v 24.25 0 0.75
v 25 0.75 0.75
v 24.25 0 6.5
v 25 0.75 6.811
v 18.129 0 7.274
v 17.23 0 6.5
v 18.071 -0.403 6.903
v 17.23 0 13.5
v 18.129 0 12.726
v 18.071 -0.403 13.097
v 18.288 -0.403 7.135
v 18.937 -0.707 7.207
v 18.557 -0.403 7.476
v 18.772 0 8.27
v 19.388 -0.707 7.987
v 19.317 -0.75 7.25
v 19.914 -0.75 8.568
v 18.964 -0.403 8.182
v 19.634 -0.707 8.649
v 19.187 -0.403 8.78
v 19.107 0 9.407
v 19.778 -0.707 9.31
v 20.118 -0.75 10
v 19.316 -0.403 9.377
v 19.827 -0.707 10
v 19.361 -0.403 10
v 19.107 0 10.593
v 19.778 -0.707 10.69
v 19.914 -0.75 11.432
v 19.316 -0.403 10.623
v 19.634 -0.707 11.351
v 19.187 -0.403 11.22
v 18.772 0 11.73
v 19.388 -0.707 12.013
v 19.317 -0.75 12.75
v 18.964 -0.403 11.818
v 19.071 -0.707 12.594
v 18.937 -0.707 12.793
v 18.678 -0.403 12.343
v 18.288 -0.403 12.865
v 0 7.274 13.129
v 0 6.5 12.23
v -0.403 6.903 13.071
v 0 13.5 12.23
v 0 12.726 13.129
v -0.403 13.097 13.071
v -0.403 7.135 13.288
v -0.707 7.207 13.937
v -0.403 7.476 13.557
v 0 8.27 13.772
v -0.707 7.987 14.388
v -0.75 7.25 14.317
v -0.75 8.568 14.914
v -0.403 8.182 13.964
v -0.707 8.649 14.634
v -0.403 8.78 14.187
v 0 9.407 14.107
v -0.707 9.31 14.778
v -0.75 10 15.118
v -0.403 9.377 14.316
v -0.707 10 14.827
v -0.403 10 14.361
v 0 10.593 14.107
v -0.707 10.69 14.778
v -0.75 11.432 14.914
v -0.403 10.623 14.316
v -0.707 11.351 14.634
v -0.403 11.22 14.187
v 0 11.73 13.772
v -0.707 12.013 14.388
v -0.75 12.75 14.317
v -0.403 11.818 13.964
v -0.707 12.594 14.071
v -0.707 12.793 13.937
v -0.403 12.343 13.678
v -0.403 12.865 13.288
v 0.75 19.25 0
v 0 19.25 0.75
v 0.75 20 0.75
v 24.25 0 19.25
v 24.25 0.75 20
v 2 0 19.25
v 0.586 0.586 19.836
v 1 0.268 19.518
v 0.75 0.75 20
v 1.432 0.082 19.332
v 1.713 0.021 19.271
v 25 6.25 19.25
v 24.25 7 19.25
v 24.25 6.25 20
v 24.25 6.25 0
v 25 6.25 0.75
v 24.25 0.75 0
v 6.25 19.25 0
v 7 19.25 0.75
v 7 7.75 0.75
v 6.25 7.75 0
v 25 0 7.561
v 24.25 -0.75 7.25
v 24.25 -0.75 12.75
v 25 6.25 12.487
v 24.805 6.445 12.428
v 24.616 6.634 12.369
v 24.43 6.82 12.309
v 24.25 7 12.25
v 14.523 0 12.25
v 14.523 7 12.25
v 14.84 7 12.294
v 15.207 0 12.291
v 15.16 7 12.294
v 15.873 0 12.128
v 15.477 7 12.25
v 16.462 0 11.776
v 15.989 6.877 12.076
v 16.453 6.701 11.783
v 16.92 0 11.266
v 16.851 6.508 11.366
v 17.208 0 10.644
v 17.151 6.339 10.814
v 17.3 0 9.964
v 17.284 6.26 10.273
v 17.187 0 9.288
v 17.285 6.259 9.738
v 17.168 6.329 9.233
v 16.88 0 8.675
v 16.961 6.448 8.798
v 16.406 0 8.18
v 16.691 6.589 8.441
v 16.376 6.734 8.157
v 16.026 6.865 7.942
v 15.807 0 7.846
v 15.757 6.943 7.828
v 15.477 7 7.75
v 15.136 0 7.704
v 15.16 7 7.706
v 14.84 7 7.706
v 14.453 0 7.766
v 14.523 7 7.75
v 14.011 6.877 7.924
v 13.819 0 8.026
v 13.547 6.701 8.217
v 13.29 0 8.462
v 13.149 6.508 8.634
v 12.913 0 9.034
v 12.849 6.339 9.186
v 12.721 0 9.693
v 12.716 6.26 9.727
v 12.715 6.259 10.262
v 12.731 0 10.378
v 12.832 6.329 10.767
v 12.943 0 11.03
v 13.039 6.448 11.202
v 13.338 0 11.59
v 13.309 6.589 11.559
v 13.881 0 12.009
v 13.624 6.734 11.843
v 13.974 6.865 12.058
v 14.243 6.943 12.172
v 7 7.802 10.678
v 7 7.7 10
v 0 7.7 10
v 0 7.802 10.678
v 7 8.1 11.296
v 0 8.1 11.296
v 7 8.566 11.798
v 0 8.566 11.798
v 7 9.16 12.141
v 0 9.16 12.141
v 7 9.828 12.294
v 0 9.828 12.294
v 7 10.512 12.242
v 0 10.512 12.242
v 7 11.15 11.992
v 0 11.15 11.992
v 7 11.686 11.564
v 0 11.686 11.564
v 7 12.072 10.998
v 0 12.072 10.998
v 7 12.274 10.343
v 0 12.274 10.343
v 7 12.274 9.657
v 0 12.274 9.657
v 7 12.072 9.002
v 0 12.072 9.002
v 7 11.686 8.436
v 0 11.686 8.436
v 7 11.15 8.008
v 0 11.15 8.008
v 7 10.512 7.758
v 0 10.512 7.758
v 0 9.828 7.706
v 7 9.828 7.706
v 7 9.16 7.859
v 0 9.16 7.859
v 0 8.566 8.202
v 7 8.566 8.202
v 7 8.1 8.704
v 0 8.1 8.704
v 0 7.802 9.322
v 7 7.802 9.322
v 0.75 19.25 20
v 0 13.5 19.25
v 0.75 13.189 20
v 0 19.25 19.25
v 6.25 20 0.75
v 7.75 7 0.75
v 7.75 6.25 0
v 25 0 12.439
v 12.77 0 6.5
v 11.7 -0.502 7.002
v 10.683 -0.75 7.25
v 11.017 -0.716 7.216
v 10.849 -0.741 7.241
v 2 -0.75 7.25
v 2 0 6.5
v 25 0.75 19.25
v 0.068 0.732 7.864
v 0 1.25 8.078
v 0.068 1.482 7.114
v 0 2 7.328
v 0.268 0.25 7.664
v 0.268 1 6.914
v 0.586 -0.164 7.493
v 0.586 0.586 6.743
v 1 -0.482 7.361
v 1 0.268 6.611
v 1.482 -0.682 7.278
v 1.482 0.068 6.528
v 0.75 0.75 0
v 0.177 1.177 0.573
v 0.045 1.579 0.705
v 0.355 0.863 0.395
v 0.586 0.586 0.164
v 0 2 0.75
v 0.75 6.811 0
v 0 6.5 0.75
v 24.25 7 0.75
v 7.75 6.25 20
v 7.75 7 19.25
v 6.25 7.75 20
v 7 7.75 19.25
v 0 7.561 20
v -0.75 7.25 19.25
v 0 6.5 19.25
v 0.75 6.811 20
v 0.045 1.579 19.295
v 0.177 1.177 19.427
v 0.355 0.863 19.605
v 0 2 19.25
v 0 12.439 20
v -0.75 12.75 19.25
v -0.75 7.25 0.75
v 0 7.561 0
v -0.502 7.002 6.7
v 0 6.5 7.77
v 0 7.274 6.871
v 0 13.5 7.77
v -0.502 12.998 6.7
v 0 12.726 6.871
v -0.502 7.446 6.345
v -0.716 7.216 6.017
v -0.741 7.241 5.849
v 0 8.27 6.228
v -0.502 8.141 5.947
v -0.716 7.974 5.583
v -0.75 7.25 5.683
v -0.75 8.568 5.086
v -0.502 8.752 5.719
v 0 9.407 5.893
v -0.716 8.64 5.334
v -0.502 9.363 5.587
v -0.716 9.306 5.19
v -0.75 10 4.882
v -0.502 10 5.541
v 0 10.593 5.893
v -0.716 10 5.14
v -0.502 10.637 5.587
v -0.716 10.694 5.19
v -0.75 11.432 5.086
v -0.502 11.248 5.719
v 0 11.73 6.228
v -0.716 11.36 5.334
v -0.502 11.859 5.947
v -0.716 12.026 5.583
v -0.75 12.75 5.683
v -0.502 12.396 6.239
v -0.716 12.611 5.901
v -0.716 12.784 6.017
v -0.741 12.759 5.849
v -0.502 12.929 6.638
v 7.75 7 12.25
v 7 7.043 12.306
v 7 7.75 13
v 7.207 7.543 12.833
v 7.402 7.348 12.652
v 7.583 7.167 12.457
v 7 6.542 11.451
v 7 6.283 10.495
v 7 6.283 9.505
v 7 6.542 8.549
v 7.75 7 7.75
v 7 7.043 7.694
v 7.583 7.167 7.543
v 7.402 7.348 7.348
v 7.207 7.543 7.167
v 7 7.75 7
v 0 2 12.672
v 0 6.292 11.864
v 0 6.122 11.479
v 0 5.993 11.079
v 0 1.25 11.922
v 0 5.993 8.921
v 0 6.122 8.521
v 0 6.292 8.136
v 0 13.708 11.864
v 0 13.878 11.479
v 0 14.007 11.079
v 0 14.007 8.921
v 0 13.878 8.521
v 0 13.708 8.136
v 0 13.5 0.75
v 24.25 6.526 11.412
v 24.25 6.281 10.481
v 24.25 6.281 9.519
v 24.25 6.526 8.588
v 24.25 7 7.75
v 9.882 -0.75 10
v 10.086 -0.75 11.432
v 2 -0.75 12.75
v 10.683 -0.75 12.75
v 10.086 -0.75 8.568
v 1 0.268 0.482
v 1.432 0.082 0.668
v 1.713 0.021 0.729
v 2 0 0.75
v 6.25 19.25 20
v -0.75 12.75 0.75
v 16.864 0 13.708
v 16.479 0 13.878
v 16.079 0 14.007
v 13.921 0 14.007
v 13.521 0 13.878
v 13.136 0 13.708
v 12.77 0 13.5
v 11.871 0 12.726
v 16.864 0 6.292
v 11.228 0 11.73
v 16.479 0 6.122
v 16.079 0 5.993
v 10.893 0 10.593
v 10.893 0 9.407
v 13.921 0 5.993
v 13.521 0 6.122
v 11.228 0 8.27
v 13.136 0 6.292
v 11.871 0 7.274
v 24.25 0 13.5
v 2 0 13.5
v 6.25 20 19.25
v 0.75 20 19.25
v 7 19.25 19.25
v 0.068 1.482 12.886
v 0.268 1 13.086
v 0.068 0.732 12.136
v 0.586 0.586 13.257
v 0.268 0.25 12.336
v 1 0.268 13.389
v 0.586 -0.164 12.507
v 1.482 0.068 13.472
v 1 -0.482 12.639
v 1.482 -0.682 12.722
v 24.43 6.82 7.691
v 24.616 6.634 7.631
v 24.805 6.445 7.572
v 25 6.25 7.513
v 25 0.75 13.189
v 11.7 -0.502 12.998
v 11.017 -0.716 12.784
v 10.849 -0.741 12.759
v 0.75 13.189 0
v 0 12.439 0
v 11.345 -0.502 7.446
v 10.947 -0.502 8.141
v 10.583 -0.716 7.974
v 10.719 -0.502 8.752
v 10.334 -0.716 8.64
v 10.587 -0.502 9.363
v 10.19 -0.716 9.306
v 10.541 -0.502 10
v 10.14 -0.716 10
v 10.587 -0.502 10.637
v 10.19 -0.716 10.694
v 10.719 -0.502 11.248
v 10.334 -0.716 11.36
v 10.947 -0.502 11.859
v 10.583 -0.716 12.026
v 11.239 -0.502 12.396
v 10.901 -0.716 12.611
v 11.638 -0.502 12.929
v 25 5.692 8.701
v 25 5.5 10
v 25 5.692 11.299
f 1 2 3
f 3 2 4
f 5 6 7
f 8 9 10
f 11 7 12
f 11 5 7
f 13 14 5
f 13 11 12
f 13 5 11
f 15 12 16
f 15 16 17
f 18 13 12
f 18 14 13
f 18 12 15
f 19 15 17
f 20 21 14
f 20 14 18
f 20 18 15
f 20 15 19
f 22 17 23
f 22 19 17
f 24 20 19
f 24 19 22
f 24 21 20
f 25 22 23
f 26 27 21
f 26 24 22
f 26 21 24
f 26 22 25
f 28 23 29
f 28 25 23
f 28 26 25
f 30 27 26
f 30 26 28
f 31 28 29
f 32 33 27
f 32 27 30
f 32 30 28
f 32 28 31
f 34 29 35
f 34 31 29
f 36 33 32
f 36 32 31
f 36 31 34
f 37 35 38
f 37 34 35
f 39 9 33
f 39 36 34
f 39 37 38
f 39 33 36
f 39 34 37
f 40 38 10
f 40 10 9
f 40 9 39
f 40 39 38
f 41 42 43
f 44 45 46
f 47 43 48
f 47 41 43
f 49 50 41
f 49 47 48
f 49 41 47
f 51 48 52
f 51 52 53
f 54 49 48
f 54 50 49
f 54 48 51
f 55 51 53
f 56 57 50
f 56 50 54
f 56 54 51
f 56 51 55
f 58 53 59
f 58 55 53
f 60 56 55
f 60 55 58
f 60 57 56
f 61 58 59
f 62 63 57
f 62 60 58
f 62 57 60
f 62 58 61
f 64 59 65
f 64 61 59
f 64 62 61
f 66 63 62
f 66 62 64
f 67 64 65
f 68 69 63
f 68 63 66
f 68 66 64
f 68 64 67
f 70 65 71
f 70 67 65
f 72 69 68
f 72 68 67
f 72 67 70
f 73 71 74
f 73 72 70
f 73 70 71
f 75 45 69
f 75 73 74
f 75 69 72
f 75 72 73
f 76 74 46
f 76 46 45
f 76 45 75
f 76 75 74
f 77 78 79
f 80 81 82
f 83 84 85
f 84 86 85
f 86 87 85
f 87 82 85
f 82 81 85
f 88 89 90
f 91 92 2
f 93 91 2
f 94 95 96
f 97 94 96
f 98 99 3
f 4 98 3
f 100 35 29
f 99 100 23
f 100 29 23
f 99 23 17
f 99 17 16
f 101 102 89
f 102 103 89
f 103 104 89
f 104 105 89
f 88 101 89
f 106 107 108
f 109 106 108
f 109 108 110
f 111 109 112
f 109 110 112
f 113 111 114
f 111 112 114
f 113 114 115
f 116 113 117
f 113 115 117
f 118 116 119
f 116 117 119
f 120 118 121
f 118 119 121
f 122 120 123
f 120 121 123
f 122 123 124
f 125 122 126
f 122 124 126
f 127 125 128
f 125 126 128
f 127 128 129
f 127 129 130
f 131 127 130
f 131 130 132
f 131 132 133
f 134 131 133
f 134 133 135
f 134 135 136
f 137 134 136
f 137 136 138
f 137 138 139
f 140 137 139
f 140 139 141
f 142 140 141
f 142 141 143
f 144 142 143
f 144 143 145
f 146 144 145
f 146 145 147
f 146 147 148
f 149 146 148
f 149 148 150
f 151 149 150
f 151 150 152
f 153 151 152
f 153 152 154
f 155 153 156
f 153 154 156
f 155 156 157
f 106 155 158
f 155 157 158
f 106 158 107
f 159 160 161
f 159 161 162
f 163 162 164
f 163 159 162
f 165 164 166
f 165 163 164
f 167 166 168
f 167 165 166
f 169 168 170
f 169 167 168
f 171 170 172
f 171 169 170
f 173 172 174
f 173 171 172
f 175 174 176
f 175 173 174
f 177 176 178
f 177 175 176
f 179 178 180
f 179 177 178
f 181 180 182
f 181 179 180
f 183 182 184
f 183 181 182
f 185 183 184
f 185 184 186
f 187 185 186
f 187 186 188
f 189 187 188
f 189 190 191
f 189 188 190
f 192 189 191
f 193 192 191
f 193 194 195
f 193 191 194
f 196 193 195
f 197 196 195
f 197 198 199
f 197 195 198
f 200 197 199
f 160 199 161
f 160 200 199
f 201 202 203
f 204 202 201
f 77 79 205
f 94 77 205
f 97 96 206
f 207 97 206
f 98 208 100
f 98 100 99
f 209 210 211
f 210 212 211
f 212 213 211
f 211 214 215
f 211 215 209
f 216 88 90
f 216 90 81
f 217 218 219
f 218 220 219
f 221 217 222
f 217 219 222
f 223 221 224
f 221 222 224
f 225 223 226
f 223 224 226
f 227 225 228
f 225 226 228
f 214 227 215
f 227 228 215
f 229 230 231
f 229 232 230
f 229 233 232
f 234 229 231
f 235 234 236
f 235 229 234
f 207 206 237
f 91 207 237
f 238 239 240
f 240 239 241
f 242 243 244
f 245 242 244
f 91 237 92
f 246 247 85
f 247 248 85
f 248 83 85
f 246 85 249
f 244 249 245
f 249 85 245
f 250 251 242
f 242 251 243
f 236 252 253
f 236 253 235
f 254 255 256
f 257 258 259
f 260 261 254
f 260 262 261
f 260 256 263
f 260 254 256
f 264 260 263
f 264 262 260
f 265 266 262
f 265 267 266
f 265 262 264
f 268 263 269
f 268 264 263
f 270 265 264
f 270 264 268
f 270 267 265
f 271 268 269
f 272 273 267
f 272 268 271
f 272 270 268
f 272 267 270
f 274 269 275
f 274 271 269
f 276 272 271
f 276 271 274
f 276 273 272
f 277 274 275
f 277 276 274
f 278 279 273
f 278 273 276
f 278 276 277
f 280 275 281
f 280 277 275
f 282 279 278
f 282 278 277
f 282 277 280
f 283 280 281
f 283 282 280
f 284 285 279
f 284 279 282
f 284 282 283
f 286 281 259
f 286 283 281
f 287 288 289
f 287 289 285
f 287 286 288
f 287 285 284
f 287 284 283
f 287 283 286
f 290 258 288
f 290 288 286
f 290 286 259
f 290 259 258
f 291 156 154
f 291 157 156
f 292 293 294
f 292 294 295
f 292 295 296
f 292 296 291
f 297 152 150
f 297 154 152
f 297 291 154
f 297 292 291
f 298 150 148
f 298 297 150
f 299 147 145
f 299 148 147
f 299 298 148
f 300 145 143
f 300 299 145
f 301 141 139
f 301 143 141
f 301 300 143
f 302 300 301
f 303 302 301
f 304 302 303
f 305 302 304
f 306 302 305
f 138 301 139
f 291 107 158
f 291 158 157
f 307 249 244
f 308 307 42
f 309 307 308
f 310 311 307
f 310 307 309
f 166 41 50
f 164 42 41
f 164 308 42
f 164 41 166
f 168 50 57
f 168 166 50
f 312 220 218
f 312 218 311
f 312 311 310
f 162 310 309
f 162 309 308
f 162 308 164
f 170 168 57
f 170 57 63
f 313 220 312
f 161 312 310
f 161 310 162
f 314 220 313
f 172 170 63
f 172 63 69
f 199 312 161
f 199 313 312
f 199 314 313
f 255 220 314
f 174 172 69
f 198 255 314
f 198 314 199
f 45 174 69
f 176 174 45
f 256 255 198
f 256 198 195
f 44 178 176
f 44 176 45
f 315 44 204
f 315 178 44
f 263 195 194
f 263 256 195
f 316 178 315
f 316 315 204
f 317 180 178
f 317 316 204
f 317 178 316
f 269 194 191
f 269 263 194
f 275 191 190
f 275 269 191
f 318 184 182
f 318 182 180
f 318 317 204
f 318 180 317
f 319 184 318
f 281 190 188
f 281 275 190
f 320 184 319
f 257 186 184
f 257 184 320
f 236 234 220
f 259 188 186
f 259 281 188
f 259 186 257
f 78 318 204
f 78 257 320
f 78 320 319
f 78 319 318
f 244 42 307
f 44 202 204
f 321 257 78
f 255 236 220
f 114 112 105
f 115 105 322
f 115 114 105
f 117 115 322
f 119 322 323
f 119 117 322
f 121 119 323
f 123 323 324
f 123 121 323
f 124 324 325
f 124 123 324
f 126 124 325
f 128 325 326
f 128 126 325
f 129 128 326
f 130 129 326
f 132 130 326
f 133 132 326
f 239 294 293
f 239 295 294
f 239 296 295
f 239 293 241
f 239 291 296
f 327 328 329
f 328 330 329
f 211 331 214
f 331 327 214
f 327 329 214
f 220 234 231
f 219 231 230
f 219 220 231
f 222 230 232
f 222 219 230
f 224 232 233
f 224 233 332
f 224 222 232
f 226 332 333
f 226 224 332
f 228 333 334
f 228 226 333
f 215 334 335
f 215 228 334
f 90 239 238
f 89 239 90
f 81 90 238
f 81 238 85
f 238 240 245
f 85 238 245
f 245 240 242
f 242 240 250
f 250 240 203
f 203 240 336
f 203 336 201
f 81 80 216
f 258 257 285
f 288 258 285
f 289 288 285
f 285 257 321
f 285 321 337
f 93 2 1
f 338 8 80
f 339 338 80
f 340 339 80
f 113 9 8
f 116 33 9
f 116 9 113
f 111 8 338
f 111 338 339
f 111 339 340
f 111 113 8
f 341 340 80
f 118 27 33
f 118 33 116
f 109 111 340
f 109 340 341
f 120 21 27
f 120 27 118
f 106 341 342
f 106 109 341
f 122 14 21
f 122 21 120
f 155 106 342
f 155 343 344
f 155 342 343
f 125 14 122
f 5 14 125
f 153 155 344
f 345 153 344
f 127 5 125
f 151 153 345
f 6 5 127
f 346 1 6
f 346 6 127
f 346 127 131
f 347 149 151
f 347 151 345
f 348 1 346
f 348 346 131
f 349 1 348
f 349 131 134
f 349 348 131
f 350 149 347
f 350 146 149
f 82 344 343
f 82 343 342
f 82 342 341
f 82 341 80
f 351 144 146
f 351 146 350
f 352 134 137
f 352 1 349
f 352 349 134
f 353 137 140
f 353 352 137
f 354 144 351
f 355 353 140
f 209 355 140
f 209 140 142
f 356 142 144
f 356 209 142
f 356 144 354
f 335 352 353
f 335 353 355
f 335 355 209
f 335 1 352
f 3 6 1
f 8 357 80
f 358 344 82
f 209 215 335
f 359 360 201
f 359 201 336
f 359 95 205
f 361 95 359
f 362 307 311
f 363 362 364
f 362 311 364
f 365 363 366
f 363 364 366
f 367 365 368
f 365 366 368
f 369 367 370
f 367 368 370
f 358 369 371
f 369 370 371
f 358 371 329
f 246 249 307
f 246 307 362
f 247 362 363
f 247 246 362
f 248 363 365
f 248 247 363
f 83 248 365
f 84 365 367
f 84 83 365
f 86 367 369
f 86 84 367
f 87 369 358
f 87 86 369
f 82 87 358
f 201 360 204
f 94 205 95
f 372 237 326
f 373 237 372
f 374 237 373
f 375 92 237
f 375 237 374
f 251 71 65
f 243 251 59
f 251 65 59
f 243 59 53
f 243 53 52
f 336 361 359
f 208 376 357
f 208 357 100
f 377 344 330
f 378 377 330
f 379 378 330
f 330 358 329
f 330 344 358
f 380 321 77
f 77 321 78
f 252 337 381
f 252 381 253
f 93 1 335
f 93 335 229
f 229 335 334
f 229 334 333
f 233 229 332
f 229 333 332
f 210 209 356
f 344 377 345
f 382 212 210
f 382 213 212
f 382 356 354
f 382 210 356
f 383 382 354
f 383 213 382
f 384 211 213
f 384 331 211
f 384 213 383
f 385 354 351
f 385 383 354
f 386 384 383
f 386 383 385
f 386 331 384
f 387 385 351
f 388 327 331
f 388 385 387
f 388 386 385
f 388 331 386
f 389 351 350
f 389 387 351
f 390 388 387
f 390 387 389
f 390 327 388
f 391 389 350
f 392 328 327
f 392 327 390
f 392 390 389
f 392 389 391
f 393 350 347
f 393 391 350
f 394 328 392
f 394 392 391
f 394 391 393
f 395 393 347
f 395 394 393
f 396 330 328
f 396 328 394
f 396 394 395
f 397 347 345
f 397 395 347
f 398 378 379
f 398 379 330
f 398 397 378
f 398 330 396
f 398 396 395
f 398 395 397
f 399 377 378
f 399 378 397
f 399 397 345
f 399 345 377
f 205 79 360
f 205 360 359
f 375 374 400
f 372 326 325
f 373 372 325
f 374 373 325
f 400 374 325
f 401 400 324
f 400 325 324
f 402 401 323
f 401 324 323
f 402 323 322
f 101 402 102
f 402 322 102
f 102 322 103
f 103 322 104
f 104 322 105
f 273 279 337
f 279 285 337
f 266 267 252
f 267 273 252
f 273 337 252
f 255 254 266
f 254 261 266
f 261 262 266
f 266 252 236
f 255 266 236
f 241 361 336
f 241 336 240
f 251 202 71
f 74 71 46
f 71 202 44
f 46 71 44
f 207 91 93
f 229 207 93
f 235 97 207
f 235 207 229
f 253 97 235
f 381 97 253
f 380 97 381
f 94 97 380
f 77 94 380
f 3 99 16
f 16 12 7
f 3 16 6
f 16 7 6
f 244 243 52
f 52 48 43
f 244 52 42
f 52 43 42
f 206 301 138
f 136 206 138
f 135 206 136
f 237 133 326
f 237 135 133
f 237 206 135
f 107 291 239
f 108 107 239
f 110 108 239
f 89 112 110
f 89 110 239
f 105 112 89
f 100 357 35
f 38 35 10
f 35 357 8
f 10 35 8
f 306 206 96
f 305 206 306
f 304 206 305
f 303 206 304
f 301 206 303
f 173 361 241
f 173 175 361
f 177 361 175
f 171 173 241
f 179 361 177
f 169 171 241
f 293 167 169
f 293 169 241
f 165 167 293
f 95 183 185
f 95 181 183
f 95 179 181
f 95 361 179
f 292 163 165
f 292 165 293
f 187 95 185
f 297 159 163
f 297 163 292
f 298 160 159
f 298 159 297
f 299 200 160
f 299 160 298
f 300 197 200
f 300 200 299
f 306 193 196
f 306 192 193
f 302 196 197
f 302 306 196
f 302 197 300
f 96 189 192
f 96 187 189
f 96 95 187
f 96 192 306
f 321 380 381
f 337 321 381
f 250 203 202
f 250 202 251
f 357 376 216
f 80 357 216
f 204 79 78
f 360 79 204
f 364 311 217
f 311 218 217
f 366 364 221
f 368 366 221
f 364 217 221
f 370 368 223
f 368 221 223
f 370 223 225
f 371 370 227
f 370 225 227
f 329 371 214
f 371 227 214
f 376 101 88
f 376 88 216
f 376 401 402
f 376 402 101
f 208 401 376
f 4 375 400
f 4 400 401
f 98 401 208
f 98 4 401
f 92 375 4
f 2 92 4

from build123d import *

# Parameters (mm, degrees)
AUFSATZ_LINEAR_AUSTRAGEN1_DEPTH      = 20
AUFSATZ_LINEAR_AUSTRAGEN2_DEPTH      = 20
AUFSATZ_LINEAR_AUSTRAGEN3_DEPTH      = 25
SCHNITT_LINEAR_AUSTRAGEN1_DEPTH      = 20
SCHNITT_LINEAR_AUSTRAGEN1_DEPTH_BACK = 20
SKIZZE2_R                            = 2.3
SKIZZE3_R                            = 3.75
SCHNITT_LINEAR_AUSTRAGEN2_DEPTH      = 34.526109228
SKIZZE4_R                            = 2.3
SCHNITT_LINEAR_AUSTRAGEN3_DEPTH      = 20
FASE1_SIZE                           = 0.75
VERRUNDUNG1_R                        = 2
SKIZZE7_R                            = 4.15
SCHNITT_LINEAR_AUSTRAGEN4_DEPTH      = 20
SKIZZE8_R                            = 4.15
SCHNITT_LINEAR_AUSTRAGEN5_DEPTH      = 20
VERRUNDUNG2_R                        = 1


with BuildPart() as part:
    # Skizze1 → Aufsatz-Linear austragen1 (new body)
    with BuildSketch(Plane.XY):
        Polygon((0, 0), (0, 20), (7, 20), (7, 7), (25, 7), (25, 0), align=None)
    extrude(amount=AUFSATZ_LINEAR_AUSTRAGEN1_DEPTH)

    # Skizze5 → Aufsatz-Linear austragen2 (add)
    with BuildSketch(Plane(origin=(0, 0, 0), x_dir=(-1, 0, 0), z_dir=(0, 0, -1))):
        Polygon((0, 6.5), (0, 13.5), (0.75, 12.75), (0.75, 7.25), align=None)
    extrude(amount=-AUFSATZ_LINEAR_AUSTRAGEN2_DEPTH)

    # Skizze6 → Aufsatz-Linear austragen3 (add)
    with BuildSketch(Plane.ZY):
        Polygon((6.5, 0), (13.5, 0), (12.75, -0.75), (7.25, -0.75), align=None)
    extrude(amount=-AUFSATZ_LINEAR_AUSTRAGEN3_DEPTH)

    # Skizze2 → Schnitt-Linear austragen1 (cut, two sides: drawn at the far end of the back side and taken through both)
    with BuildSketch(Plane.ZY.offset(-SCHNITT_LINEAR_AUSTRAGEN1_DEPTH_BACK)):
        with Locations(Location((10, 10, 0), (0, 0, 270))):
            Circle(SKIZZE2_R)
    extrude(amount=SCHNITT_LINEAR_AUSTRAGEN1_DEPTH + SCHNITT_LINEAR_AUSTRAGEN1_DEPTH_BACK, mode=Mode.SUBTRACT)

    # Skizze3 → Schnitt-Linear austragen2 (cut, through all)
    with BuildSketch(Plane(origin=(7, 0, 0), x_dir=(0, 0, -1), z_dir=(1, 0, 0))):
        with Locations((-10, 10)):
            Circle(SKIZZE3_R)
    extrude(amount=SCHNITT_LINEAR_AUSTRAGEN2_DEPTH, mode=Mode.SUBTRACT)

    # Skizze4 → Schnitt-Linear austragen3 (cut)
    with BuildSketch(Plane(origin=(0, 7, 0), x_dir=(1, 0, 0), z_dir=(0, 1, 0))):
        with Locations(Location((15, -10, 0), (0, 0, 258.031254445))):
            Circle(SKIZZE4_R)
    extrude(amount=-SCHNITT_LINEAR_AUSTRAGEN3_DEPTH, mode=Mode.SUBTRACT)

    # Fase1
    fase1_edges = [part.edges().sort_by_distance(p)[0] for p in [
        (0, 20, 10),
        (7, 20, 10),
        (7, 7, 16.125),
        (25, 7, 16.125),
        (25, 0, 16.75),
        (16, 7, 20),
        (7, 13.5, 20),
        (0, 3.25, 0),
        (0, 3.25, 20),
        (3.5, 20, 20),
        (-0.375, 6.875, 20),
        (-0.375, 13.125, 20),
        (-0.75, 10, 20),
        (-0.375, 6.875, 0),
        (-0.75, 10, 0),
        (-0.375, 13.125, 0),
        (0, 16.75, 20),
        (25, 0, 3.25),
        (25, -0.375, 13.125),
        (25, -0.75, 10),
        (25, -0.375, 6.875),
        (12.5, 0, 20),
        (7, 7, 3.875),
        (25, 7, 3.875),
        (25, 6.25, 10),
        (0, 16.75, 0),
        (3.5, 20, 0),
        (7, 13.5, 0),
        (16, 7, 0),
        (25, 3.5, 0),
        (12.5, 0, 0),
        (25, 3.5, 20),
    ]]
    chamfer(fase1_edges, length=FASE1_SIZE)

    # Verrundung1
    verrundung1_edges = [part.edges().sort_by_distance(p)[0] for p in [
        (0, 0, 3.625),
        (0, -0.375, 13.125),
        (0, -0.375, 6.875),
        (0, -0.75, 10),
        (0, 0, 16.375),
    ]]
    fillet(verrundung1_edges, radius=VERRUNDUNG1_R)

    # Skizze7 → Schnitt-Linear austragen4 (cut)
    with BuildSketch(Plane.ZY):
        with Locations((10, 10)):
            Circle(SKIZZE7_R)
    extrude(amount=SCHNITT_LINEAR_AUSTRAGEN4_DEPTH, mode=Mode.SUBTRACT)

    # Skizze8 → Schnitt-Linear austragen5 (cut)
    with BuildSketch(Plane.XZ):
        with Locations((15, 10)):
            Circle(SKIZZE8_R)
    extrude(amount=SCHNITT_LINEAR_AUSTRAGEN5_DEPTH, mode=Mode.SUBTRACT)

    # Verrundung2
    # the kernel refuses this fillet: 1 mm, written as the material it takes off along each edge
    with BuildSketch(Plane(origin=(15, -0.75, 10), x_dir=(-0.259943773458836, 0, -0.9656237541817109), z_dir=(0.9656237541817109, 0, -0.259943773458836))) as verrundung2_piece_1:
        with BuildLine():
            CenterArc((5.118245837, 1), VERRUNDUNG2_R, 194.477512186, 75.522487814)
            Line((4.15, 0.75), (4.130635083, 0.745))
            ThreePointArc((4.130635083, 0.745), (4.13, 0.375), (4.13, 0))
            Line((4.13, 0), (4.15, -0.02))
            Line((4.15, -0.02), (5.118245837, -0.02))
            Line((5.118245837, -0.02), (5.118245837, 0))
        make_face()
    revolve(axis=Axis((15, -0.75, 10), (0, 1, 0)), revolution_arc=149.866548224, mode=Mode.SUBTRACT)
    with BuildSketch(Plane(origin=(15, -0.75, 10), x_dir=(0.259943773458836, 0, -0.9656237541817109), z_dir=(-0.9656237541817109, 0, -0.259943773458836))) as verrundung2_piece_2:
        with BuildLine():
            CenterArc((5.118245837, -1), VERRUNDUNG2_R, 90, 75.522487814)
            Line((4.15, -0.75), (4.130635083, -0.745))
            ThreePointArc((4.130635083, -0.745), (4.13, -0.375), (4.13, 0))
            Line((4.13, 0), (4.15, 0.02))
            Line((4.15, 0.02), (5.118245837, 0.02))
            Line((5.118245837, 0.02), (5.118245837, 0))
        make_face()
    revolve(axis=Axis((15, -0.75, 10), (0, -1, 0)), revolution_arc=149.866548224, mode=Mode.SUBTRACT)
    with BuildSketch(Plane(origin=(-0.75, 10, 10), x_dir=(0, -0.9656237541817109, -0.2599437734588364), z_dir=(0, -0.2599437734588364, 0.9656237541817109))) as verrundung2_piece_3:
        with BuildLine():
            CenterArc((5.118245837, 1), VERRUNDUNG2_R, 194.477512186, 75.522487814)
            Line((4.15, 0.75), (4.130635083, 0.745))
            ThreePointArc((4.130635083, 0.745), (4.13, 0.375), (4.13, 0))
            Line((4.13, 0), (4.15, -0.02))
            Line((4.15, -0.02), (5.118245837, -0.02))
            Line((5.118245837, -0.02), (5.118245837, 0))
        make_face()
    revolve(axis=Axis((-0.75, 10, 10), (1, 0, 0)), revolution_arc=149.866548224, mode=Mode.SUBTRACT)
    with BuildSketch(Plane(origin=(-0.75, 10, 10), x_dir=(0, -0.9656237541817109, 0.2599437734588359), z_dir=(0, -0.2599437734588359, -0.9656237541817109))) as verrundung2_piece_4:
        with BuildLine():
            CenterArc((5.118245837, -1), VERRUNDUNG2_R, 90, 75.522487814)
            Line((4.15, -0.75), (4.130635083, -0.745))
            ThreePointArc((4.130635083, -0.745), (4.13, -0.375), (4.13, 0))
            Line((4.13, 0), (4.15, 0.02))
            Line((4.15, 0.02), (5.118245837, 0.02))
            Line((5.118245837, 0.02), (5.118245837, 0))
        make_face()
    revolve(axis=Axis((-0.75, 10, 10), (-1, 0, 0)), revolution_arc=149.866548224, mode=Mode.SUBTRACT)


solid = part.part
